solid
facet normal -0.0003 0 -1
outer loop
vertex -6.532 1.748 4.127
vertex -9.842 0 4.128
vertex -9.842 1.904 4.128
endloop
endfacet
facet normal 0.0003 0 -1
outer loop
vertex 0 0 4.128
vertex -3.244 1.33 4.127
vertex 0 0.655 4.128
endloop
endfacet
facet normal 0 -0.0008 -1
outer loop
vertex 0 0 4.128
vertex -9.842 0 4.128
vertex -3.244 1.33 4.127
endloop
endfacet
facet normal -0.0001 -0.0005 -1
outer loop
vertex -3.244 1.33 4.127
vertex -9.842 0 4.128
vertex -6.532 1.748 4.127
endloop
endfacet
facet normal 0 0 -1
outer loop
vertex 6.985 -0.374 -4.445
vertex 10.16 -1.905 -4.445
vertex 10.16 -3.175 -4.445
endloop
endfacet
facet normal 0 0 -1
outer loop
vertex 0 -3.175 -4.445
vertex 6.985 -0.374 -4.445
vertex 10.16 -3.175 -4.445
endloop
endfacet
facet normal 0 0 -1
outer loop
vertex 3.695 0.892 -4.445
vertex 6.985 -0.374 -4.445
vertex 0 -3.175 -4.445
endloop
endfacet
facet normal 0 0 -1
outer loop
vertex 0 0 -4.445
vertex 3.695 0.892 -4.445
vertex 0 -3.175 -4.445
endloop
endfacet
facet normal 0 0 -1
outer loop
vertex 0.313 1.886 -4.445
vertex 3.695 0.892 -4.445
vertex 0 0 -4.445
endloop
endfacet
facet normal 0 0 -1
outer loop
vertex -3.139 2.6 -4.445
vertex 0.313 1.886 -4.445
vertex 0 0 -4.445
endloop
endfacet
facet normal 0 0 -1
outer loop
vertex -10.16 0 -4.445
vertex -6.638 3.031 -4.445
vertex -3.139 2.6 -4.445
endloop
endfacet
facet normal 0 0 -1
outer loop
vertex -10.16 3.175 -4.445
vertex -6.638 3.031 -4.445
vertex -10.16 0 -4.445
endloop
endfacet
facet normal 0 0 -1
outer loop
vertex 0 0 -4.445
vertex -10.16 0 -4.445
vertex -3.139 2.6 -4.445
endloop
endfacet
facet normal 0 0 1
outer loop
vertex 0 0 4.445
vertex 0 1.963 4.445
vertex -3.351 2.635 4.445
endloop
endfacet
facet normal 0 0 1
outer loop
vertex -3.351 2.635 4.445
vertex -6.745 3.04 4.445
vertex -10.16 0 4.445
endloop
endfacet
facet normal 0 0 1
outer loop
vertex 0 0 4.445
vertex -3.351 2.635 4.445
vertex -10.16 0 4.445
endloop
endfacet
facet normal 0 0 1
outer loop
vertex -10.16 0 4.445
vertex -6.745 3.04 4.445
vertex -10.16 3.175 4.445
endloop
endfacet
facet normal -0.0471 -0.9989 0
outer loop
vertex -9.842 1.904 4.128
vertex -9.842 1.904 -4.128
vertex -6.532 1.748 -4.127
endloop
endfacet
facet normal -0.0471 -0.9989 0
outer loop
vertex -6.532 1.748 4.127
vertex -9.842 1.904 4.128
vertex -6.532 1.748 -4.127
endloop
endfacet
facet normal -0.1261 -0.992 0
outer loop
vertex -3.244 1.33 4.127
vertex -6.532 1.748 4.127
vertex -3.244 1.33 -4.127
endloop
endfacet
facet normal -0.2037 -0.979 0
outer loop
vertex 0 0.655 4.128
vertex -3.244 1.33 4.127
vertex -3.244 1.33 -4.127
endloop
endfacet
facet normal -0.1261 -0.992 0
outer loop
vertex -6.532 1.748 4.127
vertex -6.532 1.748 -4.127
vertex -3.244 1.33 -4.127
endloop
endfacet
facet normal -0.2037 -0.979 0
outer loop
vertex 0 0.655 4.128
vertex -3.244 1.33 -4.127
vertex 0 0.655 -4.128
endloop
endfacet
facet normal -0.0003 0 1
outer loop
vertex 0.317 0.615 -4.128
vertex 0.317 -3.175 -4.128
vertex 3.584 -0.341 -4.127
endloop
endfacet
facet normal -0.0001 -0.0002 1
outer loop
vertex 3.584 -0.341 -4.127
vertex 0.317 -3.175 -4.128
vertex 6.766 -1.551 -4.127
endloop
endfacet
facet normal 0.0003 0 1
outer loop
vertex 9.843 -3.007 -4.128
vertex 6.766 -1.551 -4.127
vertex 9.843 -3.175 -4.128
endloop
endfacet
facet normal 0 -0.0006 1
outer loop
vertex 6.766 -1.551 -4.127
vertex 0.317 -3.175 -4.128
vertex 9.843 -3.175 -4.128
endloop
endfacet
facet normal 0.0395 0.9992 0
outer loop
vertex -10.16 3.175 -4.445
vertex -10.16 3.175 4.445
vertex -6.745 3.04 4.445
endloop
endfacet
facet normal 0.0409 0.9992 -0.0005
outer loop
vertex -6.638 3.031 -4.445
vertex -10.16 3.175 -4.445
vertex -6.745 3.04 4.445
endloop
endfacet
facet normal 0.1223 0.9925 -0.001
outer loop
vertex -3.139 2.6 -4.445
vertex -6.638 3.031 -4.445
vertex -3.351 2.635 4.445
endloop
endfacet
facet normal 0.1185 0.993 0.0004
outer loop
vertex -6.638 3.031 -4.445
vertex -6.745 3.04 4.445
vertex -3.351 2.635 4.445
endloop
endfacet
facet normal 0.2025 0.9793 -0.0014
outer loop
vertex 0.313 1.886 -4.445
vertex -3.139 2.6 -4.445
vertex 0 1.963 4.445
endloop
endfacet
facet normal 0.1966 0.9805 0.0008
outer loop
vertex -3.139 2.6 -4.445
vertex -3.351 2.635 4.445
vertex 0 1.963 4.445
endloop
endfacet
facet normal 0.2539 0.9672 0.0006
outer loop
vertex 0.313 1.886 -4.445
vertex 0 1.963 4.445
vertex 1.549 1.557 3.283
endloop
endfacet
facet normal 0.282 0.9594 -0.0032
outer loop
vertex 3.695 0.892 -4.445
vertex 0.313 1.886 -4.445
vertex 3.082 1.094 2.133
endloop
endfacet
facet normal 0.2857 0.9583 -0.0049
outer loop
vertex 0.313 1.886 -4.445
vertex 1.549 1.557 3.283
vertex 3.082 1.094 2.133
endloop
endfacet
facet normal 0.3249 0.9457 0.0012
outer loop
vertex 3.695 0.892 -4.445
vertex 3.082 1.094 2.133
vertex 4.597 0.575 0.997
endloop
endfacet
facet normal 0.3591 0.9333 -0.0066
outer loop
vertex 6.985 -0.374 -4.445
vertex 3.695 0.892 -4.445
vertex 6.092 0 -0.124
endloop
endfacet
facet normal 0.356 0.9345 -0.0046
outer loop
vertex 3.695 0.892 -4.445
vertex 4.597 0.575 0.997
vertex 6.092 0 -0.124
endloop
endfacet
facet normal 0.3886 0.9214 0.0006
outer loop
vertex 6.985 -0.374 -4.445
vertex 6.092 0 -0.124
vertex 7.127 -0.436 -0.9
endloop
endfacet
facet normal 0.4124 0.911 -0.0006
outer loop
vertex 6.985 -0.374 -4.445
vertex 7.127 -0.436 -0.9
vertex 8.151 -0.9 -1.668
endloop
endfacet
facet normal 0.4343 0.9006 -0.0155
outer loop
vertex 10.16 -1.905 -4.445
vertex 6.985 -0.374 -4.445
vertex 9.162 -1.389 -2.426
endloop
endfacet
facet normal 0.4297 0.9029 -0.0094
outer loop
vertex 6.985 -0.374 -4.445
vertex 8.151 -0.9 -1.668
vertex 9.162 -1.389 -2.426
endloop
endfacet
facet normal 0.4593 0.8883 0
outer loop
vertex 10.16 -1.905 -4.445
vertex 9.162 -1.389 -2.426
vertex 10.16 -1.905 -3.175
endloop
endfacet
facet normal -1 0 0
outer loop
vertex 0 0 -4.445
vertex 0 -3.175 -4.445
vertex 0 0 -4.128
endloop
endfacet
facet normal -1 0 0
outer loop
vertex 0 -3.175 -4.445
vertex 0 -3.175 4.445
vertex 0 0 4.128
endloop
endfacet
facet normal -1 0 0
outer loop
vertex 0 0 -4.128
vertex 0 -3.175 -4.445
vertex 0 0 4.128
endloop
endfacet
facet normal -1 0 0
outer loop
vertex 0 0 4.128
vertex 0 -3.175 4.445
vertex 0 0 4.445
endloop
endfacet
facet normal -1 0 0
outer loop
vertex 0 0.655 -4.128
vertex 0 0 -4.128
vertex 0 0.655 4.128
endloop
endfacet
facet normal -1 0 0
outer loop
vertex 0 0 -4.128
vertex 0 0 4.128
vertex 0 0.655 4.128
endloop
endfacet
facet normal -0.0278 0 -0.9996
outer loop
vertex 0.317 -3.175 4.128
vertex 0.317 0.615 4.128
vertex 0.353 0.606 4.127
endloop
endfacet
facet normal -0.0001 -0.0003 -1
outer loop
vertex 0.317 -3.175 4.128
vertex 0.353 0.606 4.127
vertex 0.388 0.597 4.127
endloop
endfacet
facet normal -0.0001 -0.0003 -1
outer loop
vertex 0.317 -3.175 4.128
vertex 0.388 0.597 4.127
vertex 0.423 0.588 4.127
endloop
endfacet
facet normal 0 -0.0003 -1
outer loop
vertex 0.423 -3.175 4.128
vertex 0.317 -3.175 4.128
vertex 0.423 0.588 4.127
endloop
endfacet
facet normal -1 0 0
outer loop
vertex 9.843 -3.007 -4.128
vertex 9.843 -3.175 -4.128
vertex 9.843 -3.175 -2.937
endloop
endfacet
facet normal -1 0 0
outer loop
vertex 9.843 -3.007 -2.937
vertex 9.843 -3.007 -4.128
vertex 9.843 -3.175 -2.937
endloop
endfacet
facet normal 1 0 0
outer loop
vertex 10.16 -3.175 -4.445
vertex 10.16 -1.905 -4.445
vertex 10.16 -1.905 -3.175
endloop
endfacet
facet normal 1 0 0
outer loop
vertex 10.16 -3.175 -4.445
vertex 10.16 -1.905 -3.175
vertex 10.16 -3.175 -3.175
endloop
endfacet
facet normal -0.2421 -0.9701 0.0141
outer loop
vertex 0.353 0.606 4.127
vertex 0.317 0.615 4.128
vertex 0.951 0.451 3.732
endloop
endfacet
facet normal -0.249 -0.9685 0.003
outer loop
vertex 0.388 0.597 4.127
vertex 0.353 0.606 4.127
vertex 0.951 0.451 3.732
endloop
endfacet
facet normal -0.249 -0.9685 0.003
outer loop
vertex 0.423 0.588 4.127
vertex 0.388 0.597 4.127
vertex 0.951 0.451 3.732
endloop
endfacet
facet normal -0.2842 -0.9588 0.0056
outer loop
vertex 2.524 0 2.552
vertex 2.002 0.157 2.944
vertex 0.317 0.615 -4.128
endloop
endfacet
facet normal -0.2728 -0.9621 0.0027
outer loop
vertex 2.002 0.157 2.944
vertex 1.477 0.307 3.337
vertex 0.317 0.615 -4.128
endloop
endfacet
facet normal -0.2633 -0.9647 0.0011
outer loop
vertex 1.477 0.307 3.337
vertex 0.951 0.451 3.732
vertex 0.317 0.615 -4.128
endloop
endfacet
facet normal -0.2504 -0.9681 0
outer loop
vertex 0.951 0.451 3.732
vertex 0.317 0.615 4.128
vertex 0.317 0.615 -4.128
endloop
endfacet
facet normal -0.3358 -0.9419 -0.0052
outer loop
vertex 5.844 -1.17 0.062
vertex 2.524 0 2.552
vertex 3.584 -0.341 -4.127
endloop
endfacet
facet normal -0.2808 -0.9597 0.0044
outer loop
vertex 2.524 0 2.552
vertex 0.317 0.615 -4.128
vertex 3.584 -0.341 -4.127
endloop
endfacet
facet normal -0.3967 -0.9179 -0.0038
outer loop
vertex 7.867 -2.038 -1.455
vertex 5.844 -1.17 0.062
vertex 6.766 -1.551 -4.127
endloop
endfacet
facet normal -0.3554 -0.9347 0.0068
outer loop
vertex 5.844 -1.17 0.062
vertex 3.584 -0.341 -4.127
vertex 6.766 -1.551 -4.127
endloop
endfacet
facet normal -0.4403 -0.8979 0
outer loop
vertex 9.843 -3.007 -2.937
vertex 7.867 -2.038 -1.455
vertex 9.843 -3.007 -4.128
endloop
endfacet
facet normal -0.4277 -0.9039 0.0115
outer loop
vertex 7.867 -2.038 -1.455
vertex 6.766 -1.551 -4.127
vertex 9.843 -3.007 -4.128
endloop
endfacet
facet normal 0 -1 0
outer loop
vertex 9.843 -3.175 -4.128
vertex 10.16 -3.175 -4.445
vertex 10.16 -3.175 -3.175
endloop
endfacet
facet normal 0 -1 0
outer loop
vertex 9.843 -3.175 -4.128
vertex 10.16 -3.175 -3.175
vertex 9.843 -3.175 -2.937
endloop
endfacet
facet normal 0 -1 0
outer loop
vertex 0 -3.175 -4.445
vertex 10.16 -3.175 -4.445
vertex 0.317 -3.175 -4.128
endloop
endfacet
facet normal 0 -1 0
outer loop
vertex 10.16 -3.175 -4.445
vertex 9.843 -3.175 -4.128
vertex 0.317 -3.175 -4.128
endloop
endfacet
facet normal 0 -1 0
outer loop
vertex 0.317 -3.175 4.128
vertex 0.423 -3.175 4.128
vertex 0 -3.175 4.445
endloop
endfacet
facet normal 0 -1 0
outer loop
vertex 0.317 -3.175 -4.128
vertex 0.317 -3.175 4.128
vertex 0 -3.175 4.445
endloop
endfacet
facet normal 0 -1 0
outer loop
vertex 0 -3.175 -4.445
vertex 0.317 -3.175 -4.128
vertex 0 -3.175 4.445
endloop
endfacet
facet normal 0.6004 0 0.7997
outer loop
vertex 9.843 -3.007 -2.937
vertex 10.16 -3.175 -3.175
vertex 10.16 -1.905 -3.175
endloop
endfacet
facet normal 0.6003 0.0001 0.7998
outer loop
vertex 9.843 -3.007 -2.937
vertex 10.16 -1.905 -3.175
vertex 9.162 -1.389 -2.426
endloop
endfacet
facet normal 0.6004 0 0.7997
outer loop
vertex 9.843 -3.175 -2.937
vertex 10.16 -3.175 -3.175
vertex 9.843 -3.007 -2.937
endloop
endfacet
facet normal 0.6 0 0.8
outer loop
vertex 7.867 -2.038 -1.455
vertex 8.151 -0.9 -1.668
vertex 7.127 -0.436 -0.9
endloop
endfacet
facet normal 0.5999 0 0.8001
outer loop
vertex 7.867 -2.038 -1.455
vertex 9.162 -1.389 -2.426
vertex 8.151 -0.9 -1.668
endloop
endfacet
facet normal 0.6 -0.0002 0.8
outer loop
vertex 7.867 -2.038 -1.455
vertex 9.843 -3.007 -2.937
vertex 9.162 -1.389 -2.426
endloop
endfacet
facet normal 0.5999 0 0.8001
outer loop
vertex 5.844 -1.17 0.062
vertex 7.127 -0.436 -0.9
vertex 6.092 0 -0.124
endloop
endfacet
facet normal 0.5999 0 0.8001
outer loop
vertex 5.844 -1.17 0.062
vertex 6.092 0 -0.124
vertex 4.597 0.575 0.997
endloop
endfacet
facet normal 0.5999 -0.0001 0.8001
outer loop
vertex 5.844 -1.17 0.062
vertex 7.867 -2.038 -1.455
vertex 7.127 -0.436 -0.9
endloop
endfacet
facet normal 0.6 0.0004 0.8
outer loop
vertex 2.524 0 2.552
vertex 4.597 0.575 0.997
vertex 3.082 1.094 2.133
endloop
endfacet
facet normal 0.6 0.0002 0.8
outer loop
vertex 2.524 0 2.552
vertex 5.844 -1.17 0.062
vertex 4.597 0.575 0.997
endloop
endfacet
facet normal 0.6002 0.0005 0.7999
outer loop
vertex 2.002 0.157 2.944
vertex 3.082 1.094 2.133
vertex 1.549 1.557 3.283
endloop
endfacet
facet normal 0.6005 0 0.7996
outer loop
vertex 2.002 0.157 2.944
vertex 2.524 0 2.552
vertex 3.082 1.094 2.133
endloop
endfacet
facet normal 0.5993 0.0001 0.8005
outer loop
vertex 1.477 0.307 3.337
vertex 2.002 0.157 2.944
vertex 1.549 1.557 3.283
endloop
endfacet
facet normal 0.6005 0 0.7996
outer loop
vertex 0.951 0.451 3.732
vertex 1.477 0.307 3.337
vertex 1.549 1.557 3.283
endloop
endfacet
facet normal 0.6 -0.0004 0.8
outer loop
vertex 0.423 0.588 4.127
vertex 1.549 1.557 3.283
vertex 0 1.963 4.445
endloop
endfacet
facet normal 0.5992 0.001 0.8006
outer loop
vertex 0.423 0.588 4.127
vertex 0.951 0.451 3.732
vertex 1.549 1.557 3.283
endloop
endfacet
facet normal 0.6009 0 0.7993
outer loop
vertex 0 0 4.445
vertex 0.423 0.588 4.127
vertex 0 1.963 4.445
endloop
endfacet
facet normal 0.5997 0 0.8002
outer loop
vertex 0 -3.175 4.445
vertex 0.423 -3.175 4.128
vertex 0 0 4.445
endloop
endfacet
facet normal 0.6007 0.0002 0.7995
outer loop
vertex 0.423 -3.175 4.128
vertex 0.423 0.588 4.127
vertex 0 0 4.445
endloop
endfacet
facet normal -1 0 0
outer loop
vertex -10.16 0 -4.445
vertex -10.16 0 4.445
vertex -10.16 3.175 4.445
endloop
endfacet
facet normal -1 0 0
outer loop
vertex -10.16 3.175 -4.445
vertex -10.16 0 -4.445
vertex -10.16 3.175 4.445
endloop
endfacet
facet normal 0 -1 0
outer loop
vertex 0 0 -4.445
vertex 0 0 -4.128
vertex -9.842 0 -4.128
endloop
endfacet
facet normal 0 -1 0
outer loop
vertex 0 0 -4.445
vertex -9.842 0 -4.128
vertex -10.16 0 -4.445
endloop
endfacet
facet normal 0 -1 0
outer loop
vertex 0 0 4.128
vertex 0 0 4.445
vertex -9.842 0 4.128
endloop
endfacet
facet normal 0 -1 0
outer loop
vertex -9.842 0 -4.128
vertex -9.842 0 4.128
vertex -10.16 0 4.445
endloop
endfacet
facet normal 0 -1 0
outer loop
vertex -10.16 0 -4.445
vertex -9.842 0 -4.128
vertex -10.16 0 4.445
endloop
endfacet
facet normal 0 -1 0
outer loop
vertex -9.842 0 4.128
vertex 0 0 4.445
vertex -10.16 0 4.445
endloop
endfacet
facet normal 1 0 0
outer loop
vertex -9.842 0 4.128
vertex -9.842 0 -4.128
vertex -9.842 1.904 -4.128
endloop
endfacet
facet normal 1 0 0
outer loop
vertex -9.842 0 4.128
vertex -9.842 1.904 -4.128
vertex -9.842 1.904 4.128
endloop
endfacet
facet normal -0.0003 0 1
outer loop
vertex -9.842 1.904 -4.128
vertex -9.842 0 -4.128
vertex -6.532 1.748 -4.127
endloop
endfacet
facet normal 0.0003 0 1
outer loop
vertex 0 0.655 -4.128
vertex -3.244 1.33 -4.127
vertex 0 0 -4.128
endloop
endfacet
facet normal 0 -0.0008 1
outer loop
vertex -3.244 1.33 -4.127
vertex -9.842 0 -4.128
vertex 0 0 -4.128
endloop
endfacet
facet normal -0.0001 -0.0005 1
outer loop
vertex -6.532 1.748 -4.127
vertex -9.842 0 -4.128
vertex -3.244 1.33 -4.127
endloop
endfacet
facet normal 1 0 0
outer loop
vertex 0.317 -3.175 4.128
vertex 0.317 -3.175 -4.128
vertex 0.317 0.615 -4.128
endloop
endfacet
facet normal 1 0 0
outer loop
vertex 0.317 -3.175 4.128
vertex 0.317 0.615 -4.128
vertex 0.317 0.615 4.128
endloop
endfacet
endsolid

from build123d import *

# Parameters (mm, degrees)
BOSS_EXTRUDE1_DEPTH     = 4.445
CUT_EXTRUDE1_REACH      = 13.535
CUT_EXTRUDE1_END_RADIUS = 41.91
SKETCH2_W               = 9.8425
SKETCH2_H               = 8.255
CUT_EXTRUDE3_REACH      = 14.779
CUT_EXTRUDE3_END_RADIUS = 43.18
SKETCH3_W               = 9.525
SKETCH3_H               = 8.255
CUT_EXTRUDE5_DEPTH      = 12.535347849
CUT_EXTRUDE5_DEPTH_BACK = 12.535347849


with BuildPart() as part:
    # Sketch1 → Boss-Extrude1 (new, symmetric)
    with BuildSketch(Plane.XY):
        with BuildLine():
            Line((-10.16, 0), (-10.16, 3.175))
            ThreePointArc((-10.16, 3.175), (0.312688289, 1.885753156), (10.16, -1.905))
            Line((10.16, -1.905), (10.16, -3.175))
            Line((10.16, -3.175), (0, -3.175))
            Line((0, -3.175), (0, 0))
            Line((0, 0), (-10.16, 0))
        make_face()
    extrude(amount=BOSS_EXTRUDE1_DEPTH, both=True)

    # Cut-Extrude1: up to this cylinder (the profile starts inside it)
    cut_extrude1_end = Plane(origin=(-10.16, -40.005, 0), z_dir=(0, 0, -1)) * Cylinder(CUT_EXTRUDE1_END_RADIUS, 111.89, mode=Mode.PRIVATE)
    # Sketch2 → Cut-Extrude1 (cut, up to the surface)
    with BuildSketch(Plane.XZ, mode=Mode.PRIVATE) as cut_extrude1_sk1:
        with Locations((-4.92125, 0)):
            Rectangle(SKETCH2_W, SKETCH2_H)
    cut_extrude1_tool1 = extrude(cut_extrude1_sk1.sketch, amount=-CUT_EXTRUDE1_REACH, mode=Mode.PRIVATE) & cut_extrude1_end
    add(cut_extrude1_tool1.solids().sort_by_distance((-4.92125, 0, 0))[0], mode=Mode.SUBTRACT)

    # Cut-Extrude3: up to this cylinder (the profile starts inside it)
    cut_extrude3_end = Plane(origin=(-10.16, -41.275, 0), z_dir=(0, 0, -1)) * Cylinder(CUT_EXTRUDE3_END_RADIUS, 116.918, mode=Mode.PRIVATE)
    # Sketch3 → Cut-Extrude3 (cut, up to the surface)
    with BuildSketch(Plane.XZ.offset(3.175), mode=Mode.PRIVATE) as cut_extrude3_sk1:
        with Locations((5.08, 0)):
            Rectangle(SKETCH3_W, SKETCH3_H)
    cut_extrude3_tool1 = extrude(cut_extrude3_sk1.sketch, amount=-CUT_EXTRUDE3_REACH, mode=Mode.PRIVATE) & cut_extrude3_end
    add(cut_extrude3_tool1.solids().sort_by_distance((5.08, -3.175, 0))[0], mode=Mode.SUBTRACT)

    # Sketch7 → Cut-Extrude5 (cut, two sides)
    with BuildSketch(Plane(origin=(0, 0, 0), x_dir=(1, 0, 0), z_dir=(0, 1, 0))) as cut_extrude5_sk:
        Polygon((10.16, 3.175), (0, -4.445), (10.16, -4.445), align=None)
    extrude(amount=CUT_EXTRUDE5_DEPTH, mode=Mode.SUBTRACT)
    extrude(cut_extrude5_sk.sketch, amount=-CUT_EXTRUDE5_DEPTH_BACK, mode=Mode.SUBTRACT)


solid = part.part
